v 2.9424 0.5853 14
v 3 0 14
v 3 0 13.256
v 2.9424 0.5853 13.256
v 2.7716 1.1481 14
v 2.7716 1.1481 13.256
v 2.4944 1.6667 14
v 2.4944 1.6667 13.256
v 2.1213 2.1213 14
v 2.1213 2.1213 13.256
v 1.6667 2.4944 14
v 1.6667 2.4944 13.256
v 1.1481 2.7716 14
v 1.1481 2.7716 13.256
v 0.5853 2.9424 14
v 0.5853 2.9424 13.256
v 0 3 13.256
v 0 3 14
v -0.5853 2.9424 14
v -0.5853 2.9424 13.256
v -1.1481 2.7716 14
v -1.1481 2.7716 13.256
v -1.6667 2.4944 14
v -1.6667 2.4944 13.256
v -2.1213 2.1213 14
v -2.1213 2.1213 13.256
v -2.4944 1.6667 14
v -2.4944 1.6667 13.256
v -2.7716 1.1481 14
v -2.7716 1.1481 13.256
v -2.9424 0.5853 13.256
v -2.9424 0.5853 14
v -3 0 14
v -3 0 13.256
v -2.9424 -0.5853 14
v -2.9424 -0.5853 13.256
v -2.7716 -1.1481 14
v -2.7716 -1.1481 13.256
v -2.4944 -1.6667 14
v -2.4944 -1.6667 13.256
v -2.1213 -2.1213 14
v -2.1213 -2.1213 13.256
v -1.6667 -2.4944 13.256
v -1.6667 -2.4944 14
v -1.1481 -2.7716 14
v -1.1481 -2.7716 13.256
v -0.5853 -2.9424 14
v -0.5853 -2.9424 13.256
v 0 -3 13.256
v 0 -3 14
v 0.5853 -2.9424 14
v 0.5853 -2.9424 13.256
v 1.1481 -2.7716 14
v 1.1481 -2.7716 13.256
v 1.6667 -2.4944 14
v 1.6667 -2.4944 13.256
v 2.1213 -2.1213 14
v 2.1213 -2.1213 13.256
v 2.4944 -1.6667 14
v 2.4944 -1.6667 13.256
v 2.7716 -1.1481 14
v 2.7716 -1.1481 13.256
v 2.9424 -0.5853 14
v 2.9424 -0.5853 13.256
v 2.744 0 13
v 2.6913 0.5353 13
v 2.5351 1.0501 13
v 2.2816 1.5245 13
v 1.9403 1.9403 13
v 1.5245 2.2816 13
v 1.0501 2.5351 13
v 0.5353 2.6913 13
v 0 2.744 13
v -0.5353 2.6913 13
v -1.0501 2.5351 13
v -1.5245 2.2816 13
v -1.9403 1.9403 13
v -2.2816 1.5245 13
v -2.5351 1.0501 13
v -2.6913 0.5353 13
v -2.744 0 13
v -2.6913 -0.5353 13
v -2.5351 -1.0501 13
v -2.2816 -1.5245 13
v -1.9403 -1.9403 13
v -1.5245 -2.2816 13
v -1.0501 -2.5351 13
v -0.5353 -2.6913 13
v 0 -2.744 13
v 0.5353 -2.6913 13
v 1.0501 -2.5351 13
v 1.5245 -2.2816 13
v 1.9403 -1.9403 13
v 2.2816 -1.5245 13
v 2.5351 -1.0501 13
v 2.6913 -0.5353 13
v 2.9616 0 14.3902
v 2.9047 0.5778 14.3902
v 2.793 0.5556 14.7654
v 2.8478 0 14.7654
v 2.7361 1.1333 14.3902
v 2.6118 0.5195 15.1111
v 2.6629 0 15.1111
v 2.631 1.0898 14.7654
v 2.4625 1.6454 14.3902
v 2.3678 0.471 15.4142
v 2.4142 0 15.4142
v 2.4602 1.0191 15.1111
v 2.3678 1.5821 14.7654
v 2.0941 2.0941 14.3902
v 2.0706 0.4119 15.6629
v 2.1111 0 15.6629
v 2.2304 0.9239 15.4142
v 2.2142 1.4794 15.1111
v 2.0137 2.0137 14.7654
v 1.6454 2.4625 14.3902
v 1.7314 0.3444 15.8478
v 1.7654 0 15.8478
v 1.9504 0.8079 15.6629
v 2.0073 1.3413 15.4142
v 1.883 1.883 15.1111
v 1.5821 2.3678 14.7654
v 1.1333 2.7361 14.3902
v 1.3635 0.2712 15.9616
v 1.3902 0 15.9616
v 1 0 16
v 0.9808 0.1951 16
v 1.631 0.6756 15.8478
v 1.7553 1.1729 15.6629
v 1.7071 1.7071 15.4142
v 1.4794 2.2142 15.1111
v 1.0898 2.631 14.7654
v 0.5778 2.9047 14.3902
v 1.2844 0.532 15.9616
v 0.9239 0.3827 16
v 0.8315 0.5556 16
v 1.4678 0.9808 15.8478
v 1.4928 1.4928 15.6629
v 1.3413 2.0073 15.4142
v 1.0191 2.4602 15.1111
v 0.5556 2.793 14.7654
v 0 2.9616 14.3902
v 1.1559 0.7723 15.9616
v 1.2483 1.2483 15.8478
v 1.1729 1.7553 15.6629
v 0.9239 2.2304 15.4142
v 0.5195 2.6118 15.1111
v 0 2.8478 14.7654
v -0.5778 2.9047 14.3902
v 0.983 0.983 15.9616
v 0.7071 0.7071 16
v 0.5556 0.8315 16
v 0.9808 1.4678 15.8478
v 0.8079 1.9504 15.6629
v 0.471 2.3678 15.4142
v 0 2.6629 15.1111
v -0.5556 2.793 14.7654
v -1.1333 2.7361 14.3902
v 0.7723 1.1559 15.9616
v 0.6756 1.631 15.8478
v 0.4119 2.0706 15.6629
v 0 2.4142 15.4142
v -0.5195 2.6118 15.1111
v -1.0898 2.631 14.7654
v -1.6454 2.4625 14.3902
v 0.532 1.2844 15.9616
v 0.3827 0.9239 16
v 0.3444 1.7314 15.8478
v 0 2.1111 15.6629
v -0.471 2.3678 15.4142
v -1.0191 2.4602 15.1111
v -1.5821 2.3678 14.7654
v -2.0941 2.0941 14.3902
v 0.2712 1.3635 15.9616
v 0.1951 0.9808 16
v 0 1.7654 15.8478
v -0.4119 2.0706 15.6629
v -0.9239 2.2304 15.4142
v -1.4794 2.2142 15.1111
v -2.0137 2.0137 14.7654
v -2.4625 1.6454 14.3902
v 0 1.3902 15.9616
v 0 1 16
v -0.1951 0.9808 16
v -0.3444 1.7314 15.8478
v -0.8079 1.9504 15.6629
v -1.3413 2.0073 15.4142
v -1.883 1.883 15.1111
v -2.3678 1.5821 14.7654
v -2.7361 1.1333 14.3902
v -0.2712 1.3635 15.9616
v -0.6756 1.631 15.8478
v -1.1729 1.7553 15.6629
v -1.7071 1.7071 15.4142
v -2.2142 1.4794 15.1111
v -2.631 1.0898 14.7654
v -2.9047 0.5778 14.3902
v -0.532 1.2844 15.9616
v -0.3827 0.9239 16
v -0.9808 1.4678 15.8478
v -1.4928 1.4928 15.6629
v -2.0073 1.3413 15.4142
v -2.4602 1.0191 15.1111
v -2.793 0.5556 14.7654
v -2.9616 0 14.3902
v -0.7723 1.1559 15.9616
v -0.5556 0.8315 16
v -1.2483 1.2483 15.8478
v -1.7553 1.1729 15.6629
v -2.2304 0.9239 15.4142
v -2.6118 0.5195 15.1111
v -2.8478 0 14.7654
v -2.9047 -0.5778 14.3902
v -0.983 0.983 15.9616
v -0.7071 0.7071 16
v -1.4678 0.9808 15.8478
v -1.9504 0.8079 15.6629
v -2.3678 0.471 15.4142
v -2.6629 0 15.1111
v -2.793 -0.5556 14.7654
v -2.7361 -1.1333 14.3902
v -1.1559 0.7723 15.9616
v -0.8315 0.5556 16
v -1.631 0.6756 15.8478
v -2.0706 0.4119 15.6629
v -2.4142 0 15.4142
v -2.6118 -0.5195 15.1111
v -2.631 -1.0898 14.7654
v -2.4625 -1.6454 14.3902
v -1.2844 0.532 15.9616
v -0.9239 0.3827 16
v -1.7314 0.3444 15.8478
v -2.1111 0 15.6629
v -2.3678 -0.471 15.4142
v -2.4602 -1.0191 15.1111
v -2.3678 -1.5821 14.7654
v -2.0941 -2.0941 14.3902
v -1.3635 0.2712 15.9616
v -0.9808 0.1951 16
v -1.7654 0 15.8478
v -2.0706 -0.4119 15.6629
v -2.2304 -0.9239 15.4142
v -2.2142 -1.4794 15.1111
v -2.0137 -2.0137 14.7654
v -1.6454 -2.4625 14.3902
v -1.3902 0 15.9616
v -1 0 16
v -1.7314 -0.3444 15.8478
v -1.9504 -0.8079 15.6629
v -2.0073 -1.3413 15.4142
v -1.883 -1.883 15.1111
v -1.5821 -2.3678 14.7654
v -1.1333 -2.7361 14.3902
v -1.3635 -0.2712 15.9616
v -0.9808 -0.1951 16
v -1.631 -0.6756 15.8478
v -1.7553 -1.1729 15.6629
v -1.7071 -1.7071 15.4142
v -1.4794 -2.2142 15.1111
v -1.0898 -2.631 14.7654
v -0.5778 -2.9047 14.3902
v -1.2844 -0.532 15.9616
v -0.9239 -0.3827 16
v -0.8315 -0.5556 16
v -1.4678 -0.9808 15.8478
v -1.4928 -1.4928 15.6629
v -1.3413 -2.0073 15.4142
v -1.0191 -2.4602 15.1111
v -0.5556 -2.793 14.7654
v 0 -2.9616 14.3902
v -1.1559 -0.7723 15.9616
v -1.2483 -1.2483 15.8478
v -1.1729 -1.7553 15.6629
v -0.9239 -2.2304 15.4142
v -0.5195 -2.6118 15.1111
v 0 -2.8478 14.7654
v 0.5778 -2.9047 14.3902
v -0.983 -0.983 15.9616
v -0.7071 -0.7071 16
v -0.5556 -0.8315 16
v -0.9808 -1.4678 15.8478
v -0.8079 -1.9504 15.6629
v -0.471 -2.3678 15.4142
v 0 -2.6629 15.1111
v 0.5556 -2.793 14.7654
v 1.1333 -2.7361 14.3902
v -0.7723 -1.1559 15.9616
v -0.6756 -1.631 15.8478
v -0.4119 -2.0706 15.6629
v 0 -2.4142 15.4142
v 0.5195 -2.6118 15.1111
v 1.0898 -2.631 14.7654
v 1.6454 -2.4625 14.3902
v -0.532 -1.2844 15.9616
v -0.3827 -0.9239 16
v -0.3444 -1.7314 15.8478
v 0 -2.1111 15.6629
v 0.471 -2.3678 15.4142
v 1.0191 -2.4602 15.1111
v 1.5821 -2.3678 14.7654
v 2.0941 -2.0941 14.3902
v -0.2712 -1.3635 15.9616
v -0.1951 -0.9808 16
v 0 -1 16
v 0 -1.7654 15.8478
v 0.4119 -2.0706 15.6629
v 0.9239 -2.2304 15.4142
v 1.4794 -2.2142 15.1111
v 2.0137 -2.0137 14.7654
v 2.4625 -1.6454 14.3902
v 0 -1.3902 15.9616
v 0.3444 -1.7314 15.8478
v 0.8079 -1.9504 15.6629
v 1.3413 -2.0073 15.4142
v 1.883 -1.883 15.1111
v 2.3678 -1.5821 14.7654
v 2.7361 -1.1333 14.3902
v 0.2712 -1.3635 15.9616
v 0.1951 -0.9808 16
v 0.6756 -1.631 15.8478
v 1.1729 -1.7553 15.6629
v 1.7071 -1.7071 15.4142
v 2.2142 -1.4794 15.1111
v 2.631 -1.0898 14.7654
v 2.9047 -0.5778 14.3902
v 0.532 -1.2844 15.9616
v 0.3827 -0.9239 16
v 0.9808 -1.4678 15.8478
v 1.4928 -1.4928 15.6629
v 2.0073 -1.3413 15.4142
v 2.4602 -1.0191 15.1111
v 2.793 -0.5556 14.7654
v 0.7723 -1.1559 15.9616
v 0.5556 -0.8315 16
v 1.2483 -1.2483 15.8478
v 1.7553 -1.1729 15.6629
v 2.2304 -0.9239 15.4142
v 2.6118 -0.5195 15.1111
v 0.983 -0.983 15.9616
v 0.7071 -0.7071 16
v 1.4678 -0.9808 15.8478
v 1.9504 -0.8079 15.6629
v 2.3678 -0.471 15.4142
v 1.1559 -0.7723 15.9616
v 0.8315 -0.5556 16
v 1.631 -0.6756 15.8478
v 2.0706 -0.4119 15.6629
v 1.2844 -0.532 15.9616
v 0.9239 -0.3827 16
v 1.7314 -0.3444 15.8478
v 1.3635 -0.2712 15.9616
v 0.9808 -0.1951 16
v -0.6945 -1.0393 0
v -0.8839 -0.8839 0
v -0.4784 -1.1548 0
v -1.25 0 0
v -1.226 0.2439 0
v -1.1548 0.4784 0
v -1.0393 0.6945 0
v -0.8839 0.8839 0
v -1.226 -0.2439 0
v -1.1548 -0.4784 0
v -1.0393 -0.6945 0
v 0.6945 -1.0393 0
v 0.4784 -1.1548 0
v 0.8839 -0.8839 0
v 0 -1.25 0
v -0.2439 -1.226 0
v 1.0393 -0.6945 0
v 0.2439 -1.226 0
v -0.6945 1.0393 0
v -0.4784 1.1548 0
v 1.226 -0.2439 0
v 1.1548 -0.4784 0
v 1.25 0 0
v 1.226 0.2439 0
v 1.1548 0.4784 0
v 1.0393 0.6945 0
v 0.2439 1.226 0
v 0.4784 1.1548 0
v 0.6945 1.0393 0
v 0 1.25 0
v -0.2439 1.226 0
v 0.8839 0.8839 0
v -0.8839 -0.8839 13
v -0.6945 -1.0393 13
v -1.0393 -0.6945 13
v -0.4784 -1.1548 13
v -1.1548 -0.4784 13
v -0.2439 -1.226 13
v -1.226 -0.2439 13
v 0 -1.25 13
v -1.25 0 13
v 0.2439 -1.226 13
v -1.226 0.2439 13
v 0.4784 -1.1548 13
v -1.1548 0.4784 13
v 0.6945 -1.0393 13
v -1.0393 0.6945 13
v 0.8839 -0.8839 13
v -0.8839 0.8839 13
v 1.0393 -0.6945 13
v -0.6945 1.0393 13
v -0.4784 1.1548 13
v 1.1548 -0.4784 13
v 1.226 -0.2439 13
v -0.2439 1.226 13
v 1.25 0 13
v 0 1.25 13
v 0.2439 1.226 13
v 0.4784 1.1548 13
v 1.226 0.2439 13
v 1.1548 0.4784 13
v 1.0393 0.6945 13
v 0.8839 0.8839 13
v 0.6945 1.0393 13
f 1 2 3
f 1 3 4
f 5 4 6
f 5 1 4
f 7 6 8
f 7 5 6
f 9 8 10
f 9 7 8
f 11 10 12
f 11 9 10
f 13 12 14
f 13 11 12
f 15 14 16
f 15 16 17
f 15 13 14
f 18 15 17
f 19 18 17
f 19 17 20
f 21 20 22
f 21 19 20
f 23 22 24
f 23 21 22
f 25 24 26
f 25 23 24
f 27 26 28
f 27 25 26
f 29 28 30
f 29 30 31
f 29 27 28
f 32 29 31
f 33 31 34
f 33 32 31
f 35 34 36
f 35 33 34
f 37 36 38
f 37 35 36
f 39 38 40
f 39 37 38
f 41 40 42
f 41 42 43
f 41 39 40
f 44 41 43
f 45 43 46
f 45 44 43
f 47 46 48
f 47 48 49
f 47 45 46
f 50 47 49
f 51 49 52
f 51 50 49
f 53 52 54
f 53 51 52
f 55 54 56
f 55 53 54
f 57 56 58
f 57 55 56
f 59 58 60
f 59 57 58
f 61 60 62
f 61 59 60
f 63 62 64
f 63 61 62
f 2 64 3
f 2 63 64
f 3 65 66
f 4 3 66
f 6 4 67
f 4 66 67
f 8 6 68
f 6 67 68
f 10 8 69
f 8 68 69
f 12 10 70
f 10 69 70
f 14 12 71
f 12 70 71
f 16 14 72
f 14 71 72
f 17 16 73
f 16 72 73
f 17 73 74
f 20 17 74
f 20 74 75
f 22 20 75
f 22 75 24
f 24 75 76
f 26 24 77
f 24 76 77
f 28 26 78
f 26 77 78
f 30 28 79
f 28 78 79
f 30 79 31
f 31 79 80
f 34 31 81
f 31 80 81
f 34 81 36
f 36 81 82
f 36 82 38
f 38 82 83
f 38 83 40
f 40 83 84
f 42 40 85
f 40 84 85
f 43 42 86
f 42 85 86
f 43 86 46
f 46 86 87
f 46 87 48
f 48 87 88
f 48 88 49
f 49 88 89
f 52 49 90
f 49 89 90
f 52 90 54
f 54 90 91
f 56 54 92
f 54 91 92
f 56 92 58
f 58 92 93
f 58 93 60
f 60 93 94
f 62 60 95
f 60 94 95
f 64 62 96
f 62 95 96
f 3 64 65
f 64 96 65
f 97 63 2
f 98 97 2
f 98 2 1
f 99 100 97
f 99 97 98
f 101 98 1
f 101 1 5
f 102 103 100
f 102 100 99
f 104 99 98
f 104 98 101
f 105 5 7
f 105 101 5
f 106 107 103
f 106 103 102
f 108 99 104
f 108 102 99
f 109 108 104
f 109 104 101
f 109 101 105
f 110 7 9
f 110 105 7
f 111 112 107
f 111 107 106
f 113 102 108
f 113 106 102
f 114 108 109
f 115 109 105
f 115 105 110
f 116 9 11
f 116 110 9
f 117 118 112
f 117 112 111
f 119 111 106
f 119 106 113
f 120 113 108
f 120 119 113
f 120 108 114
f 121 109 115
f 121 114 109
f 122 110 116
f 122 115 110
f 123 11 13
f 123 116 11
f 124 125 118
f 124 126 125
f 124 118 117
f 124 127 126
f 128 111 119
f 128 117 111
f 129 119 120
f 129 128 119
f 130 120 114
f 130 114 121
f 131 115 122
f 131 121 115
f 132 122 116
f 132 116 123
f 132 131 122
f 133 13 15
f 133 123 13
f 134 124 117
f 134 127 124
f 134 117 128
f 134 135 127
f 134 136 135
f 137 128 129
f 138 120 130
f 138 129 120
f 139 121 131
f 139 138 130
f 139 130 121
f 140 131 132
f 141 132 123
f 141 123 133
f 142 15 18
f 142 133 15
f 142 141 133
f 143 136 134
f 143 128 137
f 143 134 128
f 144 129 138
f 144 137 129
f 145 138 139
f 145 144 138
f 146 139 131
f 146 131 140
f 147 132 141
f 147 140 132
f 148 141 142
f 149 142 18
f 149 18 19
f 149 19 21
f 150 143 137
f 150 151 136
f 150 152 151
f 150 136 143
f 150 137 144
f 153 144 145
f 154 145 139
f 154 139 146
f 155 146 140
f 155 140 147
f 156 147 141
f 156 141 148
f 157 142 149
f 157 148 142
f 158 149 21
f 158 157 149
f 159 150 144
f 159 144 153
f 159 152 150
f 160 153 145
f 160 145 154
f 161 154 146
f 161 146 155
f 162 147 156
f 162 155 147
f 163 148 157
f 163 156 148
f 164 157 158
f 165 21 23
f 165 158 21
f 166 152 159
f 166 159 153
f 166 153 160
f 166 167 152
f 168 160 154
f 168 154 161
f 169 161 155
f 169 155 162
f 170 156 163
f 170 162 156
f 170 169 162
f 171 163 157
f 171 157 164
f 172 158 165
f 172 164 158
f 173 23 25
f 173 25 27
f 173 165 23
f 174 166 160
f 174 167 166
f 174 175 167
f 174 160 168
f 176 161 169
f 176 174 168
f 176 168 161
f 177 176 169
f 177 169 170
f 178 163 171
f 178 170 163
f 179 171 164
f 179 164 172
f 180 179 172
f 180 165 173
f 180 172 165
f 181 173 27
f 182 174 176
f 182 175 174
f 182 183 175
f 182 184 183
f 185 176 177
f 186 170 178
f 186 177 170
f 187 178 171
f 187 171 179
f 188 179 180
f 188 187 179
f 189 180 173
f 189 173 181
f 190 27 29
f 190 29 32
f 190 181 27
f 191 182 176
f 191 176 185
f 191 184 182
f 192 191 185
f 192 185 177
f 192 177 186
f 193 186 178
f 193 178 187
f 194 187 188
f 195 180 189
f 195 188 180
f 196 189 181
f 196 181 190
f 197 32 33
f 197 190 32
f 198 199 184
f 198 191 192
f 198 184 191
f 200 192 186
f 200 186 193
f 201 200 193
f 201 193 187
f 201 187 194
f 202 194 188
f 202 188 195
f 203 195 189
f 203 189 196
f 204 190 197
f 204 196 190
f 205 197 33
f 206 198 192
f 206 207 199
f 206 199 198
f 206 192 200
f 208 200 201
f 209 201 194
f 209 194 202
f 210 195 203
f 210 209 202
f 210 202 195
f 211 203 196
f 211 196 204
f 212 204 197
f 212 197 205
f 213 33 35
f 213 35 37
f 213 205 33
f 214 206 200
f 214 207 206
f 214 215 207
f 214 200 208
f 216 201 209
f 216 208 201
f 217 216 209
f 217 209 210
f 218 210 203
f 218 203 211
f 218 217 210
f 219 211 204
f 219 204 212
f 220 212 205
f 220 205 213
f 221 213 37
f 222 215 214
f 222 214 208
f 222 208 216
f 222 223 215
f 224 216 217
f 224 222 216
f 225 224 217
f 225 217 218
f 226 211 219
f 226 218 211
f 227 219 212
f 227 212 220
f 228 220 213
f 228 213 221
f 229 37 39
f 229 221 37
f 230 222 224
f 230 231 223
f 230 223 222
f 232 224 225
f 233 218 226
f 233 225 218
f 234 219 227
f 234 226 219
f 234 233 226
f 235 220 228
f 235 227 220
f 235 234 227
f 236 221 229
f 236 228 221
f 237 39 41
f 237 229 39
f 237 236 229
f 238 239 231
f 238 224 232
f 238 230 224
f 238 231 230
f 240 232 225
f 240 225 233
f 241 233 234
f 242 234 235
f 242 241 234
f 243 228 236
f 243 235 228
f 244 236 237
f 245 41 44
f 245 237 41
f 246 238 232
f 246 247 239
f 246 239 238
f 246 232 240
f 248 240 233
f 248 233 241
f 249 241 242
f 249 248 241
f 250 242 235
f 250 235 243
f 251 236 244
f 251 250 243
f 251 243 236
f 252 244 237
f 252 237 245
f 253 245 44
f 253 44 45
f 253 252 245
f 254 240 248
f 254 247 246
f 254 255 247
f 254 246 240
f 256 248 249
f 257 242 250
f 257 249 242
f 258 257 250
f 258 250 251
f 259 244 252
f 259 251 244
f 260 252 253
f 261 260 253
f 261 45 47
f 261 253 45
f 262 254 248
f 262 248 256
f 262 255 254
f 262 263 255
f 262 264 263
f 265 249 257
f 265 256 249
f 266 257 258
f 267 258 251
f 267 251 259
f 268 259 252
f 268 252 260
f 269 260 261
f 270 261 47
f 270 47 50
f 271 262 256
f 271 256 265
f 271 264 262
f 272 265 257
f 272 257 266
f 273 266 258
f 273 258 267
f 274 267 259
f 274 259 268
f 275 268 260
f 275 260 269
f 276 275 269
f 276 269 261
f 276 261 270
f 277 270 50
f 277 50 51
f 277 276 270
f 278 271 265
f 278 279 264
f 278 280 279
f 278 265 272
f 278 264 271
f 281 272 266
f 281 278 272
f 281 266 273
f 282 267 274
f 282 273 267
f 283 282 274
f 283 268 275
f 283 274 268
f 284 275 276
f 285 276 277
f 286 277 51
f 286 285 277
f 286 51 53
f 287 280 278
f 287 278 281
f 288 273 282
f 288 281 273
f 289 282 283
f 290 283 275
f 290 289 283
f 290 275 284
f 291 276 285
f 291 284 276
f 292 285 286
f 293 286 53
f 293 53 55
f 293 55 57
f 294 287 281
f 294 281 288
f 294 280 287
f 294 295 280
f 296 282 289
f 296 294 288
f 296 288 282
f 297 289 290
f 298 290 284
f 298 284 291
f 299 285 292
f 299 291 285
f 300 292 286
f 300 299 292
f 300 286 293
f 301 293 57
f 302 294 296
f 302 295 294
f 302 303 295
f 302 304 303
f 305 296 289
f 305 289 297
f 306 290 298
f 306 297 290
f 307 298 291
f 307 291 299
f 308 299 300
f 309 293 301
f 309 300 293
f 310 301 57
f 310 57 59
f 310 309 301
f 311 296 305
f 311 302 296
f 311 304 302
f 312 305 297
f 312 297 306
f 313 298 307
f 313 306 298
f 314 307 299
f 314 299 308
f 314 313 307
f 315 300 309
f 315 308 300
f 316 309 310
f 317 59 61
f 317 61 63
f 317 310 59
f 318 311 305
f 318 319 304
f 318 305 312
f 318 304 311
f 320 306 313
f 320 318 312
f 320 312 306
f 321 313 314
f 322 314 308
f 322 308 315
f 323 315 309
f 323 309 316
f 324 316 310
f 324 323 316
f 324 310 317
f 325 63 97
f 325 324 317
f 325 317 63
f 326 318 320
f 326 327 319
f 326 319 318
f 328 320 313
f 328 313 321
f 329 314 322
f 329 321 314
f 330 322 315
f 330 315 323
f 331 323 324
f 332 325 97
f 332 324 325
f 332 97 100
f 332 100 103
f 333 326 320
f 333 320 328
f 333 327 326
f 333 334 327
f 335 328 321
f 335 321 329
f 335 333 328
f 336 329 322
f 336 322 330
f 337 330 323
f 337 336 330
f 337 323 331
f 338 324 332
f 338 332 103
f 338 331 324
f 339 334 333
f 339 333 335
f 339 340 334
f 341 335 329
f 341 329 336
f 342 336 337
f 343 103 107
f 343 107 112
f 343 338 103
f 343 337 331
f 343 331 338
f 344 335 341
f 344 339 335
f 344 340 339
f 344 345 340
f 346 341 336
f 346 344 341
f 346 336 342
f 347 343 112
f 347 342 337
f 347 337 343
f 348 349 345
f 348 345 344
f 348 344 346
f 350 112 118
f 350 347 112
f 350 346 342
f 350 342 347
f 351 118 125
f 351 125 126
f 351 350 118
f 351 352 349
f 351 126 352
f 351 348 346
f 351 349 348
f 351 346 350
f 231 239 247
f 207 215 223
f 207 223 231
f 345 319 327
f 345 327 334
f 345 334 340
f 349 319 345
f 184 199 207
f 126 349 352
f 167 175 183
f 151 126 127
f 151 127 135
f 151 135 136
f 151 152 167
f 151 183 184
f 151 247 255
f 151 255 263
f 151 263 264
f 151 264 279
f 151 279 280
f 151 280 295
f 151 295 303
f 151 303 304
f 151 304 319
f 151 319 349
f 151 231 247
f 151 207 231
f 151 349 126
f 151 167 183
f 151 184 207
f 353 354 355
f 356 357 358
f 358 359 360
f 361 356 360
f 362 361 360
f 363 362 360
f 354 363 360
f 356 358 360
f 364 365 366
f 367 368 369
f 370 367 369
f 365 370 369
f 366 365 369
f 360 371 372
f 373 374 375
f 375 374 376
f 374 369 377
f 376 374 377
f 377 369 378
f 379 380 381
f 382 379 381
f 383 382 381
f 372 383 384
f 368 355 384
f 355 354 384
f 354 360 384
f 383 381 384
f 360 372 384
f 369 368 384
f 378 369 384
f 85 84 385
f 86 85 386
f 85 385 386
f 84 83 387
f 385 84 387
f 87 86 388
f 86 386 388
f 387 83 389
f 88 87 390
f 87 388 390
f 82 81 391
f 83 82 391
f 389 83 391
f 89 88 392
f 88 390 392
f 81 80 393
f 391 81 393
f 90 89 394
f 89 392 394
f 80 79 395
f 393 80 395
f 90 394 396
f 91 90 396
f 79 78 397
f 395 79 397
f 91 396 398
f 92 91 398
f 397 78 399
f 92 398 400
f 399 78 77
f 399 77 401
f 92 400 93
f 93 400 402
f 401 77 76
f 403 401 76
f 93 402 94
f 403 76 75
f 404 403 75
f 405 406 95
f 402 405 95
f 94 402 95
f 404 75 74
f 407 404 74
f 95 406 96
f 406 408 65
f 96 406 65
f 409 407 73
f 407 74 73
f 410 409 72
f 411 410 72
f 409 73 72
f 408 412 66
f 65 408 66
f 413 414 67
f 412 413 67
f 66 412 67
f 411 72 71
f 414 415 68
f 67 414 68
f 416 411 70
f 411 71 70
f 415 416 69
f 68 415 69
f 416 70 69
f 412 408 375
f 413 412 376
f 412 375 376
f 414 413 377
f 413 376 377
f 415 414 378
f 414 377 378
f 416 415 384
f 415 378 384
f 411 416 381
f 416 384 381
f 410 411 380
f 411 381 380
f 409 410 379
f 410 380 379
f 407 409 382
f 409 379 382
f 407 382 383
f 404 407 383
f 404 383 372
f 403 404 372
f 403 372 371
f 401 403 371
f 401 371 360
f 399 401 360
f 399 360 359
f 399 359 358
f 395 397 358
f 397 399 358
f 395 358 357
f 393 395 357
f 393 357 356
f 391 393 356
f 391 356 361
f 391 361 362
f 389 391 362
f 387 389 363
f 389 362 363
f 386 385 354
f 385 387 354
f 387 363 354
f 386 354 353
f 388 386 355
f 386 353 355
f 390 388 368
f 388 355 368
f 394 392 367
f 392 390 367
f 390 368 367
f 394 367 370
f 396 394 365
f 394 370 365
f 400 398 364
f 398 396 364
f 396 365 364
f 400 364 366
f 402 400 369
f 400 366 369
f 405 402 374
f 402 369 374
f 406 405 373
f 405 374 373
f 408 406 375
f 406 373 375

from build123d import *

# Parameters (mm, degrees)
SKETCH1_R           = 1.25
BOSS_EXTRUDE1_DEPTH = 16
SKETCH2_R           = 3
BOSS_EXTRUDE2_DEPTH = 3
FILLET1_R           = 2
CHAMFER1_SIZE       = 0.256


with BuildPart() as part:
    # Sketch1 → Boss-Extrude1 (new body)
    with BuildSketch(Plane.XY):
        Circle(SKETCH1_R)
    extrude(amount=BOSS_EXTRUDE1_DEPTH)

    # Sketch2 → Boss-Extrude2 (add)
    with BuildSketch(Plane.XY.offset(16)):
        Circle(SKETCH2_R)
    extrude(amount=-BOSS_EXTRUDE2_DEPTH)

    # Fillet1
    fillet1_edges = [part.edges().sort_by_distance(p)[0] for p in [
        (-3, 0, 16),
    ]]
    fillet(fillet1_edges, radius=FILLET1_R)

    # Chamfer1
    chamfer1_edges = [part.edges().sort_by_distance(p)[0] for p in [
        (-3, 0, 13),
    ]]
    chamfer(chamfer1_edges, length=CHAMFER1_SIZE)


solid = part.part
